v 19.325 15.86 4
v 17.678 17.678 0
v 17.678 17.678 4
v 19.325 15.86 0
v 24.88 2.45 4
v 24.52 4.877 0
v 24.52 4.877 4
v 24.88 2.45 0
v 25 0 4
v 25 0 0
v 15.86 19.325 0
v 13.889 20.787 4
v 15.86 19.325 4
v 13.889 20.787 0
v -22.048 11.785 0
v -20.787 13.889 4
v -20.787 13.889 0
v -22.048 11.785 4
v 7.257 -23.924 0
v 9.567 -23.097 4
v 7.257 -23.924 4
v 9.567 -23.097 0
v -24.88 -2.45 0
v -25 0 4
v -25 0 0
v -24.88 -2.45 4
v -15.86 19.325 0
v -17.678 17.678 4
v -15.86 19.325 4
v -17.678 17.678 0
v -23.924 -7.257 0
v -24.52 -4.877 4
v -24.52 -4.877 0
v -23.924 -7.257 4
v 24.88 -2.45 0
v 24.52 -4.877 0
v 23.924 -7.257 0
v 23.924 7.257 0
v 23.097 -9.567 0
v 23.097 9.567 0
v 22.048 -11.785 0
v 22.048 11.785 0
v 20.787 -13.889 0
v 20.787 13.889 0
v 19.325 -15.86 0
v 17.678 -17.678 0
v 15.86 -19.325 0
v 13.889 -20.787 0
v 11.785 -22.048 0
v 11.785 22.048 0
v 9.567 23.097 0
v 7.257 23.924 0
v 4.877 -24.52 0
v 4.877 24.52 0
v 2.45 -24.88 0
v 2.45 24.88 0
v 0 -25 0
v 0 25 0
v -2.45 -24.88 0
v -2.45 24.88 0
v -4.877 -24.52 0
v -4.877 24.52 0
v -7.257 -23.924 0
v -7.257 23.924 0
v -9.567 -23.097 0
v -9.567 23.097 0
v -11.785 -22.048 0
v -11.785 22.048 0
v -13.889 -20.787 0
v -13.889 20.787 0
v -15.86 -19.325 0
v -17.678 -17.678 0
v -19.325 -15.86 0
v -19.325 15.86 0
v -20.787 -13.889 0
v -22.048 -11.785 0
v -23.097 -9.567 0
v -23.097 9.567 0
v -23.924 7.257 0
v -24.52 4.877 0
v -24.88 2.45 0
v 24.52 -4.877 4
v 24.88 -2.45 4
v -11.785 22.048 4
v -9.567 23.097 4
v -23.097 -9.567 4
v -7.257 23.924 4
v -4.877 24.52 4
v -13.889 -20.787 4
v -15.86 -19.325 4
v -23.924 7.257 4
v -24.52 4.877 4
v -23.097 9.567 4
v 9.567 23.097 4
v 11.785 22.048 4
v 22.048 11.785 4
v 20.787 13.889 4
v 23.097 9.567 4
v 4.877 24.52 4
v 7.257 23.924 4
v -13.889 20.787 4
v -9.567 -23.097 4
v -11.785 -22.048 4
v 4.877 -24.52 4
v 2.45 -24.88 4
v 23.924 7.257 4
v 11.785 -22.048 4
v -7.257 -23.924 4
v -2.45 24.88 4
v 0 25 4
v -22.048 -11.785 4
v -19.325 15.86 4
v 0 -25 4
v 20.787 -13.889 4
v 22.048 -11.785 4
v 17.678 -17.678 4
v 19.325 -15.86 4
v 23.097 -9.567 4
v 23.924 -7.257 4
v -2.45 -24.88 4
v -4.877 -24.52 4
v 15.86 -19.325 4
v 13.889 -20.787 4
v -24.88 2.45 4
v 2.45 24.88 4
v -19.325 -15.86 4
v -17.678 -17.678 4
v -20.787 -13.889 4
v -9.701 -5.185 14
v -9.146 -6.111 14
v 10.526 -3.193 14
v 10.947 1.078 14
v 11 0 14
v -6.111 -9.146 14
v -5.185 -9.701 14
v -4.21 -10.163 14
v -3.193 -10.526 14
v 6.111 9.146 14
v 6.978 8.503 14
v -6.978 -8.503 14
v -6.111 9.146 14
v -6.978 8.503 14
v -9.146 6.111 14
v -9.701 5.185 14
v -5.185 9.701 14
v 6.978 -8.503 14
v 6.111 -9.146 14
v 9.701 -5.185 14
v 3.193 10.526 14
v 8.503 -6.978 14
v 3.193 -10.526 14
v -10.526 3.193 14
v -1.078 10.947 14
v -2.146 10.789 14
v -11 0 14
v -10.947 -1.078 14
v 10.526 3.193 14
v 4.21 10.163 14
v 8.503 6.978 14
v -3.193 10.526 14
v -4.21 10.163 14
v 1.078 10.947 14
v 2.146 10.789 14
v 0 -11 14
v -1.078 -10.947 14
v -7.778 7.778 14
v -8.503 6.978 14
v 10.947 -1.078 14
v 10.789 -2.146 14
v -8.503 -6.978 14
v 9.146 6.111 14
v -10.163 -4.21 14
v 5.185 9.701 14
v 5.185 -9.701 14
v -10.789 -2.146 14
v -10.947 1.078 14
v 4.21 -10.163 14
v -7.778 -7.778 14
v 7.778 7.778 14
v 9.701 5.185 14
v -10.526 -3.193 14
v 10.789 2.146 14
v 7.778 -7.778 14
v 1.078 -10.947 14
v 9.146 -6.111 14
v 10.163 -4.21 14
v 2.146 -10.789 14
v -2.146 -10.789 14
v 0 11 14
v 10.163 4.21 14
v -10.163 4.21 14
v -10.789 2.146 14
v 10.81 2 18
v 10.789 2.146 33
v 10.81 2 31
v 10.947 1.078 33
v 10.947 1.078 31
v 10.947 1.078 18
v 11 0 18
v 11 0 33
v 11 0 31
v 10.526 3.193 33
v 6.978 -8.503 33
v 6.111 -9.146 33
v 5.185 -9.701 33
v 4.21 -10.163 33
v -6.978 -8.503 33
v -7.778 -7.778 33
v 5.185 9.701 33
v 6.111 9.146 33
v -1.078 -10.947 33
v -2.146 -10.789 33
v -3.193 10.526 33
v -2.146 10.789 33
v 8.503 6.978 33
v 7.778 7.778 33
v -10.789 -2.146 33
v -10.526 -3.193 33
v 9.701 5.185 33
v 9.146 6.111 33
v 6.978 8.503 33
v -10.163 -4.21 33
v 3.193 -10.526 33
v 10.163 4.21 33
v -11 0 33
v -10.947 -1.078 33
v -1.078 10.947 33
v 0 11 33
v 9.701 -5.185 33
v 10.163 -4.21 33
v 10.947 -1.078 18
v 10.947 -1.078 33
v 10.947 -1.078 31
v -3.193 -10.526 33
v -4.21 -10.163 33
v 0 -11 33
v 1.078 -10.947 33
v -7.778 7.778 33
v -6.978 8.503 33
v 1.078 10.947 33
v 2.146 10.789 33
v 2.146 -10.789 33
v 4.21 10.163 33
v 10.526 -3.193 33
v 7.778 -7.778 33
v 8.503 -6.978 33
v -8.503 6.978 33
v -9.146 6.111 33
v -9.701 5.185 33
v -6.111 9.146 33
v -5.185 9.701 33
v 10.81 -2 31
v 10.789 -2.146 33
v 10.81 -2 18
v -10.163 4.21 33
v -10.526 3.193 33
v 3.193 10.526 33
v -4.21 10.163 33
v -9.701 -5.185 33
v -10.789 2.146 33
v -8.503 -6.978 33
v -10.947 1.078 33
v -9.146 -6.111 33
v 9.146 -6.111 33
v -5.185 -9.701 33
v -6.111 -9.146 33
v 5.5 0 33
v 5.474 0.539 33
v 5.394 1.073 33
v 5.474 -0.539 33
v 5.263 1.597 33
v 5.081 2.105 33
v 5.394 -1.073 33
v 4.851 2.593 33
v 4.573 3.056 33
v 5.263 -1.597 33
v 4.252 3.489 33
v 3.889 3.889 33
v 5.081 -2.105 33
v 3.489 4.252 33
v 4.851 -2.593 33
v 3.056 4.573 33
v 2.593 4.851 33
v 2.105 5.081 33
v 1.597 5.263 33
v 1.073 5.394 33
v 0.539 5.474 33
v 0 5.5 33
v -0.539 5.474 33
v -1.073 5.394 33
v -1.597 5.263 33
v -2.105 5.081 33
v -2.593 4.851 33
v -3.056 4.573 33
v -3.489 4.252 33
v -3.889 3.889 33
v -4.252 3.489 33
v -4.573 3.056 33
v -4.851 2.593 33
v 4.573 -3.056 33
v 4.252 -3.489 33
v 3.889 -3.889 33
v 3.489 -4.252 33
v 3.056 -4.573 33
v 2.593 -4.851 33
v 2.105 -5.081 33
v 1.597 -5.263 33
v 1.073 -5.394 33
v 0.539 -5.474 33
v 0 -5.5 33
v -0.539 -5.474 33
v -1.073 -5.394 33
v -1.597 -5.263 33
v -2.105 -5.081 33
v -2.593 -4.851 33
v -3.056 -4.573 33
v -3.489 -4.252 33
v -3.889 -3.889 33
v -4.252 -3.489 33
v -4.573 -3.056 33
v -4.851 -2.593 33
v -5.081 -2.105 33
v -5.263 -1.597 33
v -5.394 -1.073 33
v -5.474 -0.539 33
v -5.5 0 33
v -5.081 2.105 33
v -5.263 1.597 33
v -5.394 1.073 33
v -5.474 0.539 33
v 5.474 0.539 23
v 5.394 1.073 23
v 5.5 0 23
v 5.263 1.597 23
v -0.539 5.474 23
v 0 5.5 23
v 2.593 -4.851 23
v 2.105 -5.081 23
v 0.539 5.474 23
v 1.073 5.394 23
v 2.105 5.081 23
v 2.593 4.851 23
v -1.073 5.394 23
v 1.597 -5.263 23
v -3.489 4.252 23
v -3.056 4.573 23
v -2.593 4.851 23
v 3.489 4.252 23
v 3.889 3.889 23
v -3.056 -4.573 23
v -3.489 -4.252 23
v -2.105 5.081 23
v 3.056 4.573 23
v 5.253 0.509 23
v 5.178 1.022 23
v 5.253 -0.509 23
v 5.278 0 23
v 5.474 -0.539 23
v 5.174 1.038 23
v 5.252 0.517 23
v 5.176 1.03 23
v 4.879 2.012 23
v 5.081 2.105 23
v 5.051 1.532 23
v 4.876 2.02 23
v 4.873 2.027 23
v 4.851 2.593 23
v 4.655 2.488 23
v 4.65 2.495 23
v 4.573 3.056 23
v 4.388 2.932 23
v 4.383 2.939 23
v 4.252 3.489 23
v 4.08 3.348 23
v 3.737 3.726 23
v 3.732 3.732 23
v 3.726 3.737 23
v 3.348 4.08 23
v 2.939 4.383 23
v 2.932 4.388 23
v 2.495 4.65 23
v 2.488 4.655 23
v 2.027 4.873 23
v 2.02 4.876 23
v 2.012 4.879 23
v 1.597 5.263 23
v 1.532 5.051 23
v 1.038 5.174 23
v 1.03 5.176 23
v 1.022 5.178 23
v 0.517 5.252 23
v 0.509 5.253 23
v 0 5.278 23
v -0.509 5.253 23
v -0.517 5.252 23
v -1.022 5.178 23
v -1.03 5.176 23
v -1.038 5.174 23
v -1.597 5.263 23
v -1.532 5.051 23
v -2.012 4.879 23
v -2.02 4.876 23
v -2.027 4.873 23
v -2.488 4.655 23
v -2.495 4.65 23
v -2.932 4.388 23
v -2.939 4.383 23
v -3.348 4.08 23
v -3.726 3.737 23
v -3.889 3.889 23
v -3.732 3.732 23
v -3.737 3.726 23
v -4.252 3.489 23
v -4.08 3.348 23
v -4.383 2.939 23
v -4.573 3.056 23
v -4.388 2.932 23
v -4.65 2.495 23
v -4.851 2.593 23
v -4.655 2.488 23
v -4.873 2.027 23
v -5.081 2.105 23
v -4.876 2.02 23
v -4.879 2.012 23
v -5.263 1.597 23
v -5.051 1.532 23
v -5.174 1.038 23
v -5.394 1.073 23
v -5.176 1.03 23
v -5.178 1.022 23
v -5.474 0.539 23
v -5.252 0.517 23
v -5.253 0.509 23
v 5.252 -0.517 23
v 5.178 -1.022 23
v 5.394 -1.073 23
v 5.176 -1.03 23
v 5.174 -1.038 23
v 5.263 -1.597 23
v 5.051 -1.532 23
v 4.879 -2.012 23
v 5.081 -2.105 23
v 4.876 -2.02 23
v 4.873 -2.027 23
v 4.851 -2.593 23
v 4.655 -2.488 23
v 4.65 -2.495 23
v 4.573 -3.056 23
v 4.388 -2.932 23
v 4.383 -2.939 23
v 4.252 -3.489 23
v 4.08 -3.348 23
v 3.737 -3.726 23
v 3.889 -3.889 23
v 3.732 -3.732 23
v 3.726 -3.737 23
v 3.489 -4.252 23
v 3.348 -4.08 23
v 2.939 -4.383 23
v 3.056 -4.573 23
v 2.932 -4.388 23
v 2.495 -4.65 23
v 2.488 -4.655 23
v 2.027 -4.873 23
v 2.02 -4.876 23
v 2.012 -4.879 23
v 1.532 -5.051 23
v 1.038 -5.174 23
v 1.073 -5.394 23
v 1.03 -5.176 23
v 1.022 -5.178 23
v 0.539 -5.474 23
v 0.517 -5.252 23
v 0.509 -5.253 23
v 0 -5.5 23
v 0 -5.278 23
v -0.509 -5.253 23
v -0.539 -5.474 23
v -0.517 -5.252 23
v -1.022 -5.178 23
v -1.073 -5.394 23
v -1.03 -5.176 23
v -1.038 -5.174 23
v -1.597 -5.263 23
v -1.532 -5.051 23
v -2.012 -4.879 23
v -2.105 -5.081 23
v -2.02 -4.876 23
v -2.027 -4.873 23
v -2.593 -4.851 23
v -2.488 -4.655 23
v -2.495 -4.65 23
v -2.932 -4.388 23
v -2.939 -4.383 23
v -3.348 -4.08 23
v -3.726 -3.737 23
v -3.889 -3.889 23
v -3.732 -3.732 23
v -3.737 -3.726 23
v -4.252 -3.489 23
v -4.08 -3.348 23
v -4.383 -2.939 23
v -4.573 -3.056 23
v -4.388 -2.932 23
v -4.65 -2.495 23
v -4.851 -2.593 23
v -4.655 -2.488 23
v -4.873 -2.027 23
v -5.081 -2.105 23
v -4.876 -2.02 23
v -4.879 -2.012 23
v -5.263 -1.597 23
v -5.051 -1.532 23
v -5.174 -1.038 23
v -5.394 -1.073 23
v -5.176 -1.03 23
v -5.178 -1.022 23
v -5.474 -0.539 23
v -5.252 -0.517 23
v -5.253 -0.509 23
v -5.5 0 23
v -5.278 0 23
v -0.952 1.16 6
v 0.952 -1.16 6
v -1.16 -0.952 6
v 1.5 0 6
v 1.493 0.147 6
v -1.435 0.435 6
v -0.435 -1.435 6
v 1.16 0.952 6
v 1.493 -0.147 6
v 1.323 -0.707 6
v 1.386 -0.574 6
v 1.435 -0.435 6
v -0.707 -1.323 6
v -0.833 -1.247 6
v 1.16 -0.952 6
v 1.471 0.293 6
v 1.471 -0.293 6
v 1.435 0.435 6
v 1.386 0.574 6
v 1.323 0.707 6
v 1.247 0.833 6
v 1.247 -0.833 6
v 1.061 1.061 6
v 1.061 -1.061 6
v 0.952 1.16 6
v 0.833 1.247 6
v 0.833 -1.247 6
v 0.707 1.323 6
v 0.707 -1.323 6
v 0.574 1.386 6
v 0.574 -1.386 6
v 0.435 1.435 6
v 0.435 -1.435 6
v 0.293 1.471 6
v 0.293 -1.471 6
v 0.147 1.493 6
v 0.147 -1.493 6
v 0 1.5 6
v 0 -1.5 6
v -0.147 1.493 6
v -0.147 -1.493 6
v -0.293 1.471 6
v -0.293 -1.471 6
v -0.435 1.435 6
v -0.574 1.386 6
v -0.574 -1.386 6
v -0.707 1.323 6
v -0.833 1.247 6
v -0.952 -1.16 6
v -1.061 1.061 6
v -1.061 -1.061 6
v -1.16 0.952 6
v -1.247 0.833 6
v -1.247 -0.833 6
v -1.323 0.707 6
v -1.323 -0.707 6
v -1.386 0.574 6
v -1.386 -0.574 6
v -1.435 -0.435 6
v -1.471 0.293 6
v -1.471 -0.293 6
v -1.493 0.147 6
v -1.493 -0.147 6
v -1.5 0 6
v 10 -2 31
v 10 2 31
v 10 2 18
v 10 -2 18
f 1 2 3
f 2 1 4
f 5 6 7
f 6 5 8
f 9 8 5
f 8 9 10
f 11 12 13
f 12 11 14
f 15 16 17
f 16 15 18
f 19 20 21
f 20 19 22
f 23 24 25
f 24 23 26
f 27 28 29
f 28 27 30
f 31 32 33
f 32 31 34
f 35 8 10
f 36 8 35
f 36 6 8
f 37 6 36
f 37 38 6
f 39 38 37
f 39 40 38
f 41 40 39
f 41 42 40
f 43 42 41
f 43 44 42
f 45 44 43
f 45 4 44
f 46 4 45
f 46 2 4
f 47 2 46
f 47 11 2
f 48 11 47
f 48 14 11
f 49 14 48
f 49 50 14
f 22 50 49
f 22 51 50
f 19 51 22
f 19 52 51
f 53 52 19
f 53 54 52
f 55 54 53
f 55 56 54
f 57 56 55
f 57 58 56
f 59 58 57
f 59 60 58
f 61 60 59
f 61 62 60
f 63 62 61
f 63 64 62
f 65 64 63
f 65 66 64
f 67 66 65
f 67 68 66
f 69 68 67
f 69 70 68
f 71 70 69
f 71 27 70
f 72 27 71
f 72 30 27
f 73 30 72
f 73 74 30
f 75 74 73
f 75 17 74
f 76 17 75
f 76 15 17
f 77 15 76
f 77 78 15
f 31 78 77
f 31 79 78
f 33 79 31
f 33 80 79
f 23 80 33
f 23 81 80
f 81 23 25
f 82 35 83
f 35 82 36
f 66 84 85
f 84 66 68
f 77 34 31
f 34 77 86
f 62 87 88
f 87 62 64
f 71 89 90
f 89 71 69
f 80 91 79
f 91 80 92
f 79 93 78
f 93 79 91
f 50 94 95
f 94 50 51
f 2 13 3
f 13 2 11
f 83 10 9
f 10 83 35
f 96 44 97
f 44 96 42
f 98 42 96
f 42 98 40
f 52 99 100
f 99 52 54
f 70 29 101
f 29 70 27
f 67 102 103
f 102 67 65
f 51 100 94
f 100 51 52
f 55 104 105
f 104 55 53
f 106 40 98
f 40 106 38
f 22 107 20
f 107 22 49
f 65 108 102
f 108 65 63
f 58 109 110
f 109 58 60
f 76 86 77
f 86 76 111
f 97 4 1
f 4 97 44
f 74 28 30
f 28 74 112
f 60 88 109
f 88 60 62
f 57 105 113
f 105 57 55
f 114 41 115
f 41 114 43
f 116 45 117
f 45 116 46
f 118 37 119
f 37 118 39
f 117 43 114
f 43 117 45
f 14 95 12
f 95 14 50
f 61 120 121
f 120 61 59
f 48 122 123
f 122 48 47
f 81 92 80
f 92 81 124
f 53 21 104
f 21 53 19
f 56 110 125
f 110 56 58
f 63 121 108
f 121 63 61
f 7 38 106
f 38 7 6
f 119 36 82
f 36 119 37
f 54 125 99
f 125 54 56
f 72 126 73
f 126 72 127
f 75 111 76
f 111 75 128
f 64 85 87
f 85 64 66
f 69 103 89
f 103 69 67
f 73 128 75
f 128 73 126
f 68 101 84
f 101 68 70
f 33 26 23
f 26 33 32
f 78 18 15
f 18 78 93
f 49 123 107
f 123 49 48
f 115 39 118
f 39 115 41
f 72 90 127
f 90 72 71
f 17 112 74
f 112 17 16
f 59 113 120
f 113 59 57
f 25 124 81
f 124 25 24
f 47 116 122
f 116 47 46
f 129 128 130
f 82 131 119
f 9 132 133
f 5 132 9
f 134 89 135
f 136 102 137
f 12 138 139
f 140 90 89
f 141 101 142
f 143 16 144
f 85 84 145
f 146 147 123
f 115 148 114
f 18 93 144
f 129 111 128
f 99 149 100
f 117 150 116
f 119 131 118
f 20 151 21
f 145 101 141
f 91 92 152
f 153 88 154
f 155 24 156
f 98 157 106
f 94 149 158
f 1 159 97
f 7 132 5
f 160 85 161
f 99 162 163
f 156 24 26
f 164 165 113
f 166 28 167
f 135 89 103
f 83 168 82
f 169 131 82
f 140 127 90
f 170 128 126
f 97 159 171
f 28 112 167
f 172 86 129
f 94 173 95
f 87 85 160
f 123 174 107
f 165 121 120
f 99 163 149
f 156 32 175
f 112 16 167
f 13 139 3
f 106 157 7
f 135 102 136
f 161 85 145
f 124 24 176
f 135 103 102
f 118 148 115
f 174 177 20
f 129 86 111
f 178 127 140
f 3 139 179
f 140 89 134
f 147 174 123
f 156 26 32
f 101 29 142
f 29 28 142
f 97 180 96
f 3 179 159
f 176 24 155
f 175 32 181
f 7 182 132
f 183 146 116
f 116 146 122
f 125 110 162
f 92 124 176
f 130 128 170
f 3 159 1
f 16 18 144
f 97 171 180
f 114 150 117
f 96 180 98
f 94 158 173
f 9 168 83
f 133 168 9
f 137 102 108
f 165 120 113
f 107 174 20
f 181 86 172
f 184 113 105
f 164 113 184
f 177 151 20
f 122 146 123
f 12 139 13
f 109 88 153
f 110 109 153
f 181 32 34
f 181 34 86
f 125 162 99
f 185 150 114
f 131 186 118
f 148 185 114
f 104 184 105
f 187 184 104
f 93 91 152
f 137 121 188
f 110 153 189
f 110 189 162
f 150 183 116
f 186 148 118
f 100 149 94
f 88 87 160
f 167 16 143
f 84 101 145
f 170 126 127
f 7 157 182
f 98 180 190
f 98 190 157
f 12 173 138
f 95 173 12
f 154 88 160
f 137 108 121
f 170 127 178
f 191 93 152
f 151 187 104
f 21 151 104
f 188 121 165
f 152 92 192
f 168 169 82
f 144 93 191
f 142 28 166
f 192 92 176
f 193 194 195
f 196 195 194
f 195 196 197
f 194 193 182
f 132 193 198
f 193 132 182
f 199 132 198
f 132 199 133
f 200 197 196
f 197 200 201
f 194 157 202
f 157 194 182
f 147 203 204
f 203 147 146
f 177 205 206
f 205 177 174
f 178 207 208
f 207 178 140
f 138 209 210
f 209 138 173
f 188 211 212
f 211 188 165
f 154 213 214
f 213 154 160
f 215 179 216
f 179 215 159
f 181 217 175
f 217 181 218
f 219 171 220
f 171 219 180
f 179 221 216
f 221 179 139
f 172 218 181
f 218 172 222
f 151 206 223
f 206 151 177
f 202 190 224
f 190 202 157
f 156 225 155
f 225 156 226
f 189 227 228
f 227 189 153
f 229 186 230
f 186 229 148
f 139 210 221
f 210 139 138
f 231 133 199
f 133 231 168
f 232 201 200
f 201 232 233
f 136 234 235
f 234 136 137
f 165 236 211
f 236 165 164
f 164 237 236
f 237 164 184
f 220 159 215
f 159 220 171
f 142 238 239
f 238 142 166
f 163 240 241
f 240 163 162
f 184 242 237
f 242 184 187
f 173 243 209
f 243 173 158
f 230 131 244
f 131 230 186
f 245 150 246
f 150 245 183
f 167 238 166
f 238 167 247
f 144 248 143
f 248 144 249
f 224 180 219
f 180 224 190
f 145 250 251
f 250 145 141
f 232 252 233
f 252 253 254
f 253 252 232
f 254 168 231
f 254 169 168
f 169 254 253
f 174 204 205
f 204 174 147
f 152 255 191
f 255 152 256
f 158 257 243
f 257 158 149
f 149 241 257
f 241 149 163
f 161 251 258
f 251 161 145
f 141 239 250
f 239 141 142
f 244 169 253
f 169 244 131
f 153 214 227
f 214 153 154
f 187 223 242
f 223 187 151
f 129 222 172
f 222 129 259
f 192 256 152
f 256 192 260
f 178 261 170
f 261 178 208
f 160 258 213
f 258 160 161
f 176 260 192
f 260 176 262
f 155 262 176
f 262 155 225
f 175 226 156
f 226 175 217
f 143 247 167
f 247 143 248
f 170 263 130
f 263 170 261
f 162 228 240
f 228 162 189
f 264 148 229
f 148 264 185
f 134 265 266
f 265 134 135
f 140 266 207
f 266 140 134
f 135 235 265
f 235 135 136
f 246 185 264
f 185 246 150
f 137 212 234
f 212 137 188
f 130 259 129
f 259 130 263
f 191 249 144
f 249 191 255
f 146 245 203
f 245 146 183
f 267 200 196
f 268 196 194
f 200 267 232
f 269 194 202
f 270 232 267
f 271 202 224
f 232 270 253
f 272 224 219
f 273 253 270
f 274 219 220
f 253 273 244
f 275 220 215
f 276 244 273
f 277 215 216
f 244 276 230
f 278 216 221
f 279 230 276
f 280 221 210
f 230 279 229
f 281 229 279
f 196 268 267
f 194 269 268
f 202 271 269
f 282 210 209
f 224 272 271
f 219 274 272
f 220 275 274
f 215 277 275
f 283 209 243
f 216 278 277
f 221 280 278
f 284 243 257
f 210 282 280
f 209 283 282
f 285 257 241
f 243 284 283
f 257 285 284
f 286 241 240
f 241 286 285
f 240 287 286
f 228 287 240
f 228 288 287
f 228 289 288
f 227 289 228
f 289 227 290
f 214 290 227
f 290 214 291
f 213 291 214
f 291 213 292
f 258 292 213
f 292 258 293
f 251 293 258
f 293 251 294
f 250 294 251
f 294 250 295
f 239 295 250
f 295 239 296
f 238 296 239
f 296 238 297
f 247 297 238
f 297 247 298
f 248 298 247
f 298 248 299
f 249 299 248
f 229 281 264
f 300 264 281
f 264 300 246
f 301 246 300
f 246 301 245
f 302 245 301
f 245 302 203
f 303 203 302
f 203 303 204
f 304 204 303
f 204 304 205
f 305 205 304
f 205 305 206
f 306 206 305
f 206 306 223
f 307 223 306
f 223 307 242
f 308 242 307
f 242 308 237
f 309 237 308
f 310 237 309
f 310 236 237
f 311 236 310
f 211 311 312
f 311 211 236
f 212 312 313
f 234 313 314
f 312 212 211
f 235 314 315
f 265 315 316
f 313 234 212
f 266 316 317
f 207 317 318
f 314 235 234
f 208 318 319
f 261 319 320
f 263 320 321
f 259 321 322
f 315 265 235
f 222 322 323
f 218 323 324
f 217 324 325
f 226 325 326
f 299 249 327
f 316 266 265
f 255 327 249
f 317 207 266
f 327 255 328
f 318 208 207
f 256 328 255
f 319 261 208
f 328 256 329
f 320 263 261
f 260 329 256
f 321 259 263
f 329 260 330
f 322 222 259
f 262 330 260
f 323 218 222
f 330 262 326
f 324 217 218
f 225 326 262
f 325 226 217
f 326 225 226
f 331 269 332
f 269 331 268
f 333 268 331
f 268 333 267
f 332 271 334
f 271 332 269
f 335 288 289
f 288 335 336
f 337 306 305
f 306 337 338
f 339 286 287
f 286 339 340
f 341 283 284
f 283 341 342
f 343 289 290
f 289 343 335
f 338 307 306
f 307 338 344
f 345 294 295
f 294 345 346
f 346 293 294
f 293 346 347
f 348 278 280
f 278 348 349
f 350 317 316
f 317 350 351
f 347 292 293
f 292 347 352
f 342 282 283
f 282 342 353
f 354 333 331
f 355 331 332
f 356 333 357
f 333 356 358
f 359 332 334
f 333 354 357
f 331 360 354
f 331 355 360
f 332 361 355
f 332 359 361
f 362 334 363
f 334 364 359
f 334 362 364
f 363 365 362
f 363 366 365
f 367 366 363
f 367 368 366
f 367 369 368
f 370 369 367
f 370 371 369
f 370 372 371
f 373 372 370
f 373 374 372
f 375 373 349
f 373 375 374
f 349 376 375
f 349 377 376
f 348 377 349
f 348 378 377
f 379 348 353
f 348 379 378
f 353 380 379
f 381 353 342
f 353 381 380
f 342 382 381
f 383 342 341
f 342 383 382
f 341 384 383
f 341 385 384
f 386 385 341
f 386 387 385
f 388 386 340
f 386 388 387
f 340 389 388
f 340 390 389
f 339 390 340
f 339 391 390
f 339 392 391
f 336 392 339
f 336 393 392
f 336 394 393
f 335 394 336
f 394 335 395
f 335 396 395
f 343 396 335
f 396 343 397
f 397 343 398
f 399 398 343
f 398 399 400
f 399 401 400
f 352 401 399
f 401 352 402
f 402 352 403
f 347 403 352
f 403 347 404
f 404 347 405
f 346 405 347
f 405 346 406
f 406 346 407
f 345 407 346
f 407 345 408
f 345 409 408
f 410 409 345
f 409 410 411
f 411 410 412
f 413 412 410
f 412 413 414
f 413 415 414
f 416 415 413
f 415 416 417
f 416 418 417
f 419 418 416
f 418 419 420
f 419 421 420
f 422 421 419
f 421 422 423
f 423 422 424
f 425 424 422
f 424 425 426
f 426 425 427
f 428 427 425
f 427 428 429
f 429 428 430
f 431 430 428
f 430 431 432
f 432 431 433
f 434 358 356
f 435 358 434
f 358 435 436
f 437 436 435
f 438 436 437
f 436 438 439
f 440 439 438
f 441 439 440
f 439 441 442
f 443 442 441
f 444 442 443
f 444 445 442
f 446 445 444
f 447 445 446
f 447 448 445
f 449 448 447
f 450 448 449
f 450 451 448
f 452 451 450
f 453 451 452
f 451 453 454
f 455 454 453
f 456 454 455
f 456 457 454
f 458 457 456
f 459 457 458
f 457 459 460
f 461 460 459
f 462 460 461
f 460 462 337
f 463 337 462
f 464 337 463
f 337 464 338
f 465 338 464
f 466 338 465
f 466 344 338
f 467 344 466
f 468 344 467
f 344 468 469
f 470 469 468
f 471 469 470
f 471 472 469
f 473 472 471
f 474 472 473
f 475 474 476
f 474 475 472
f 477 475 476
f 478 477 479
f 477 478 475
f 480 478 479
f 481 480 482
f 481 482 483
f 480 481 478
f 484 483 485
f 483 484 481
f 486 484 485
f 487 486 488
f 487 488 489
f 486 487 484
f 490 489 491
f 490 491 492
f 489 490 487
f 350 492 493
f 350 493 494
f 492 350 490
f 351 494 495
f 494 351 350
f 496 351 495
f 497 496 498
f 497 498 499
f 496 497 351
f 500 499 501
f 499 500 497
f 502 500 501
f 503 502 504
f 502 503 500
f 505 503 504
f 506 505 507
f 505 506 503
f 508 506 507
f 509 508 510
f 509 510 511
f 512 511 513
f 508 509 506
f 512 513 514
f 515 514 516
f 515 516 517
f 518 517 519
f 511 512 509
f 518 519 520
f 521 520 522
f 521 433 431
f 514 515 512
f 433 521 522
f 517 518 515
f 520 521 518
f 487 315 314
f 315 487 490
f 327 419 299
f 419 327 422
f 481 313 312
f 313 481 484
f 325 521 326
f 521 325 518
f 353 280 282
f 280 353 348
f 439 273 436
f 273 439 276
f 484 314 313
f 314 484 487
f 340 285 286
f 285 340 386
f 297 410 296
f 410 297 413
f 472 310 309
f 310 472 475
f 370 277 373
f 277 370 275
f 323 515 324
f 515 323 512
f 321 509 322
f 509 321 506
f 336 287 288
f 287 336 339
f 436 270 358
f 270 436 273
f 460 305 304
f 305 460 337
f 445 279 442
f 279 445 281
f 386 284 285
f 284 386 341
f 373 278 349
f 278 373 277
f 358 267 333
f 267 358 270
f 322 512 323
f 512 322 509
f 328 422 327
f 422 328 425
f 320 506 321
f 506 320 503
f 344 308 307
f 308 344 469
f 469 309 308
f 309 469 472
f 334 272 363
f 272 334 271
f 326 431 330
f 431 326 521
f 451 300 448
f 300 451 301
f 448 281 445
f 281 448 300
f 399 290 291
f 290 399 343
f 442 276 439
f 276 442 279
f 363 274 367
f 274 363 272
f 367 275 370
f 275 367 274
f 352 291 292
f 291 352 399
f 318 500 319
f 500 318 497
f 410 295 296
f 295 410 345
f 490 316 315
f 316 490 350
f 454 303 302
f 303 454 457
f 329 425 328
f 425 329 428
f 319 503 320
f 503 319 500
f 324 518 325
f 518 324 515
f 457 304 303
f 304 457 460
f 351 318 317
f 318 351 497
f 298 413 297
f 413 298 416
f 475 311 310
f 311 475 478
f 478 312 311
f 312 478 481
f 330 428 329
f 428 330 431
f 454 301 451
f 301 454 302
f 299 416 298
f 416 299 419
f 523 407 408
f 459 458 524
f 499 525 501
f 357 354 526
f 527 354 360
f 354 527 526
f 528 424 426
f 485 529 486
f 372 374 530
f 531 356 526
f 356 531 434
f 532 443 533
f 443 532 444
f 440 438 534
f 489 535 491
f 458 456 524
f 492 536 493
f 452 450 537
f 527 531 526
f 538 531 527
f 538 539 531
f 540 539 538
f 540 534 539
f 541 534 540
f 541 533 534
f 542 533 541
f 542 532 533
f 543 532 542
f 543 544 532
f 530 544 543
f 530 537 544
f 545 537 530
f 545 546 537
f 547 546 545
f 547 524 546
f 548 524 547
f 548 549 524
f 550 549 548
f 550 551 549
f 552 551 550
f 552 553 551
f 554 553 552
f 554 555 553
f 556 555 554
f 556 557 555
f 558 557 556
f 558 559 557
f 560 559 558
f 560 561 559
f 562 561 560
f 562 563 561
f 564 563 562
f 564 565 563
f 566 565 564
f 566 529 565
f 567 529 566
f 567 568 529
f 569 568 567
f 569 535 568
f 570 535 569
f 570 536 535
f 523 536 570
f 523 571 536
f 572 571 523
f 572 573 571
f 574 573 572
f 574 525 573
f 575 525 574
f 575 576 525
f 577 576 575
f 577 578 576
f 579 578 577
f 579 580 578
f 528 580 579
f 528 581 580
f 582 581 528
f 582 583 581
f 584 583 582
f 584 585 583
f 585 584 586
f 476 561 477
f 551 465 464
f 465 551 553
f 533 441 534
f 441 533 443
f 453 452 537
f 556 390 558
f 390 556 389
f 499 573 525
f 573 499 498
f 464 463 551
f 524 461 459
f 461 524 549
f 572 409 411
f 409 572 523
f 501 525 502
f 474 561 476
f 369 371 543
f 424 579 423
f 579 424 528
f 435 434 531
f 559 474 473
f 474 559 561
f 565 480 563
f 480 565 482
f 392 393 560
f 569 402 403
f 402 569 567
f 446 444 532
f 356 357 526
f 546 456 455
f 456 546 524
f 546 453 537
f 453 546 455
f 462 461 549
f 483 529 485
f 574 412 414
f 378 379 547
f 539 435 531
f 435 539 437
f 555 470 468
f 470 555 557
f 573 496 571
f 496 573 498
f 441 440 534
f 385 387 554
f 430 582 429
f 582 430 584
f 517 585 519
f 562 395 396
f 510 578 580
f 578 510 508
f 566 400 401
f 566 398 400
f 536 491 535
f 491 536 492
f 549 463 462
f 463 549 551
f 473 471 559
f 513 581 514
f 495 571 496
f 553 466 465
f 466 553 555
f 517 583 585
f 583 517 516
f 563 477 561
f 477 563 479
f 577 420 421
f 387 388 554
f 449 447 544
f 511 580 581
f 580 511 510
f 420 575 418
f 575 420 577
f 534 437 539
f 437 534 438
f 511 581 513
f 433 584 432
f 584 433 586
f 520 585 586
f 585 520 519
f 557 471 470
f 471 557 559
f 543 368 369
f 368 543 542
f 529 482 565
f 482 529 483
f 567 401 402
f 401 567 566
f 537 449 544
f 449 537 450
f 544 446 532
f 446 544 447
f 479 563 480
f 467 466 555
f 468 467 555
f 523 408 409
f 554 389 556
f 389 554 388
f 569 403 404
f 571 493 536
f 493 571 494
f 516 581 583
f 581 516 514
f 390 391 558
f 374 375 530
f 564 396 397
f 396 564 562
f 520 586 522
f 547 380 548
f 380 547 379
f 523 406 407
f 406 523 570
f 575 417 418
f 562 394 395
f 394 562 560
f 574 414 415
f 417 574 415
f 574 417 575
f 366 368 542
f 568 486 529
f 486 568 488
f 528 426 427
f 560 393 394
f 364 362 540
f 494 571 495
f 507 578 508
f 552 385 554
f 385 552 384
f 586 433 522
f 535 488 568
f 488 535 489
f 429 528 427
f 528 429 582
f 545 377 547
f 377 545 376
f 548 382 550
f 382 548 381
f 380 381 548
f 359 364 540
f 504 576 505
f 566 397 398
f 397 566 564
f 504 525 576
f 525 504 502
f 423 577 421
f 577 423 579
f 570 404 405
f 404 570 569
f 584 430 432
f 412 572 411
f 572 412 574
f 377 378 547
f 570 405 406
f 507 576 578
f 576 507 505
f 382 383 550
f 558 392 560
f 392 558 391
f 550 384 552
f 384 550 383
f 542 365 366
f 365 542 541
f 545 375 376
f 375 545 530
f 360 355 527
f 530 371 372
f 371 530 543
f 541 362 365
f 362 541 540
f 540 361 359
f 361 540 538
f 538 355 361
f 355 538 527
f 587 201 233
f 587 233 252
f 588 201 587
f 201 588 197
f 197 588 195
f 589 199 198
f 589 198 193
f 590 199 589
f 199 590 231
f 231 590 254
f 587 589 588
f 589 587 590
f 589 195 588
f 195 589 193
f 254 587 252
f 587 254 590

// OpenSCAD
// --- Dimensions ---
base_diameter = 50.0;       // Diameter of the base disc
base_height = 4.0;          // Height of the base disc
cone_bottom_dia = 50.0;     // Diameter at the bottom of the cone (z=4)
cone_top_dia = 22.0;        // Diameter at the top of the cone (z=14)
cone_height = 10.0;         // Height of the cone section (14 - 4)
column_diameter = 22.0;      // Diameter of the top column
column_height = 19.0;        // Height of the column (33 - 14)
total_height = 33.0;        // Total height of the object

// Tube Seat Dimensions
seat_top_dia = 11.0;        // Diameter of the cylindrical part of the seat
seat_top_z = 33.0;          // Z-coordinate at the top of the seat
seat_mid_z = 23.0;          // Z-coordinate where seat transitions to cone
seat_mid_dia = 11.0;        // Diameter at the transition point
seat_bottom_dia = 3.0;      // Diameter at the tip of the seat cone
seat_bottom_z = 6.0;        // Z-coordinate at the tip of the seat cone

// Viewing Window Dimensions
window_width_y = 4.0;       // Width of the window in Y direction
window_height_start = 18.0; // Z-coordinate where window starts
window_height_end = 30.0;   // Z-coordinate where window ends

// --- Parameters ---
$fn = 64;

// --- Main Construction ---

difference() {
    // THE SOLID BODY
    union() {
        // 1. The Base Disc
        cylinder(d = base_diameter, h = base_height);

        // 2. The Cone Section
        translate([0, 0, base_height])
        cylinder(d1 = cone_bottom_dia, d2 = cone_top_dia, h = cone_height);

        // 3. The Top Column
        translate([0, 0, base_height + cone_height])
        cylinder(d = column_diameter, h = column_height);
    }

    // THE TUBE SEAT (Subtracted)
    // Part 1: Cylindrical seat (z=23 to z=33)
    // We extend the height slightly to ensure a clean cut at the top face
    translate([0, 0, seat_mid_z])
    cylinder(d = seat_top_dia, h = (seat_top_z - seat_mid_z) + 1.0);
    
    // Part 2: Conical seat (z=6 to z=23)
    // We extend the bottom to ensure it cuts through the base/cone if necessary
    translate([0, 0, seat_bottom_z])
    cylinder(d1 = seat_bottom_dia, d2 = seat_mid_dia, h = (seat_mid_z - seat_bottom_z) + 1.0);

    // THE VIEWING WINDOW (Subtracted)
    // The window is cut through the column wall on the +X side.
    // It is 4mm wide in Y, meaning it spans from Y = -2 to Y = 2.
    // To ensure it cuts through the entire side of the column, we use a large cube.
    // We translate it so the center of the window is at X = column_diameter/2.
    // The cube width is large enough to pass through the center.
    translate([column_diameter/2 - 1, -window_width_y/2, window_height_start])
    cube([column_diameter, window_width_y, (window_height_end - window_height_start) + 1.0]);
}
